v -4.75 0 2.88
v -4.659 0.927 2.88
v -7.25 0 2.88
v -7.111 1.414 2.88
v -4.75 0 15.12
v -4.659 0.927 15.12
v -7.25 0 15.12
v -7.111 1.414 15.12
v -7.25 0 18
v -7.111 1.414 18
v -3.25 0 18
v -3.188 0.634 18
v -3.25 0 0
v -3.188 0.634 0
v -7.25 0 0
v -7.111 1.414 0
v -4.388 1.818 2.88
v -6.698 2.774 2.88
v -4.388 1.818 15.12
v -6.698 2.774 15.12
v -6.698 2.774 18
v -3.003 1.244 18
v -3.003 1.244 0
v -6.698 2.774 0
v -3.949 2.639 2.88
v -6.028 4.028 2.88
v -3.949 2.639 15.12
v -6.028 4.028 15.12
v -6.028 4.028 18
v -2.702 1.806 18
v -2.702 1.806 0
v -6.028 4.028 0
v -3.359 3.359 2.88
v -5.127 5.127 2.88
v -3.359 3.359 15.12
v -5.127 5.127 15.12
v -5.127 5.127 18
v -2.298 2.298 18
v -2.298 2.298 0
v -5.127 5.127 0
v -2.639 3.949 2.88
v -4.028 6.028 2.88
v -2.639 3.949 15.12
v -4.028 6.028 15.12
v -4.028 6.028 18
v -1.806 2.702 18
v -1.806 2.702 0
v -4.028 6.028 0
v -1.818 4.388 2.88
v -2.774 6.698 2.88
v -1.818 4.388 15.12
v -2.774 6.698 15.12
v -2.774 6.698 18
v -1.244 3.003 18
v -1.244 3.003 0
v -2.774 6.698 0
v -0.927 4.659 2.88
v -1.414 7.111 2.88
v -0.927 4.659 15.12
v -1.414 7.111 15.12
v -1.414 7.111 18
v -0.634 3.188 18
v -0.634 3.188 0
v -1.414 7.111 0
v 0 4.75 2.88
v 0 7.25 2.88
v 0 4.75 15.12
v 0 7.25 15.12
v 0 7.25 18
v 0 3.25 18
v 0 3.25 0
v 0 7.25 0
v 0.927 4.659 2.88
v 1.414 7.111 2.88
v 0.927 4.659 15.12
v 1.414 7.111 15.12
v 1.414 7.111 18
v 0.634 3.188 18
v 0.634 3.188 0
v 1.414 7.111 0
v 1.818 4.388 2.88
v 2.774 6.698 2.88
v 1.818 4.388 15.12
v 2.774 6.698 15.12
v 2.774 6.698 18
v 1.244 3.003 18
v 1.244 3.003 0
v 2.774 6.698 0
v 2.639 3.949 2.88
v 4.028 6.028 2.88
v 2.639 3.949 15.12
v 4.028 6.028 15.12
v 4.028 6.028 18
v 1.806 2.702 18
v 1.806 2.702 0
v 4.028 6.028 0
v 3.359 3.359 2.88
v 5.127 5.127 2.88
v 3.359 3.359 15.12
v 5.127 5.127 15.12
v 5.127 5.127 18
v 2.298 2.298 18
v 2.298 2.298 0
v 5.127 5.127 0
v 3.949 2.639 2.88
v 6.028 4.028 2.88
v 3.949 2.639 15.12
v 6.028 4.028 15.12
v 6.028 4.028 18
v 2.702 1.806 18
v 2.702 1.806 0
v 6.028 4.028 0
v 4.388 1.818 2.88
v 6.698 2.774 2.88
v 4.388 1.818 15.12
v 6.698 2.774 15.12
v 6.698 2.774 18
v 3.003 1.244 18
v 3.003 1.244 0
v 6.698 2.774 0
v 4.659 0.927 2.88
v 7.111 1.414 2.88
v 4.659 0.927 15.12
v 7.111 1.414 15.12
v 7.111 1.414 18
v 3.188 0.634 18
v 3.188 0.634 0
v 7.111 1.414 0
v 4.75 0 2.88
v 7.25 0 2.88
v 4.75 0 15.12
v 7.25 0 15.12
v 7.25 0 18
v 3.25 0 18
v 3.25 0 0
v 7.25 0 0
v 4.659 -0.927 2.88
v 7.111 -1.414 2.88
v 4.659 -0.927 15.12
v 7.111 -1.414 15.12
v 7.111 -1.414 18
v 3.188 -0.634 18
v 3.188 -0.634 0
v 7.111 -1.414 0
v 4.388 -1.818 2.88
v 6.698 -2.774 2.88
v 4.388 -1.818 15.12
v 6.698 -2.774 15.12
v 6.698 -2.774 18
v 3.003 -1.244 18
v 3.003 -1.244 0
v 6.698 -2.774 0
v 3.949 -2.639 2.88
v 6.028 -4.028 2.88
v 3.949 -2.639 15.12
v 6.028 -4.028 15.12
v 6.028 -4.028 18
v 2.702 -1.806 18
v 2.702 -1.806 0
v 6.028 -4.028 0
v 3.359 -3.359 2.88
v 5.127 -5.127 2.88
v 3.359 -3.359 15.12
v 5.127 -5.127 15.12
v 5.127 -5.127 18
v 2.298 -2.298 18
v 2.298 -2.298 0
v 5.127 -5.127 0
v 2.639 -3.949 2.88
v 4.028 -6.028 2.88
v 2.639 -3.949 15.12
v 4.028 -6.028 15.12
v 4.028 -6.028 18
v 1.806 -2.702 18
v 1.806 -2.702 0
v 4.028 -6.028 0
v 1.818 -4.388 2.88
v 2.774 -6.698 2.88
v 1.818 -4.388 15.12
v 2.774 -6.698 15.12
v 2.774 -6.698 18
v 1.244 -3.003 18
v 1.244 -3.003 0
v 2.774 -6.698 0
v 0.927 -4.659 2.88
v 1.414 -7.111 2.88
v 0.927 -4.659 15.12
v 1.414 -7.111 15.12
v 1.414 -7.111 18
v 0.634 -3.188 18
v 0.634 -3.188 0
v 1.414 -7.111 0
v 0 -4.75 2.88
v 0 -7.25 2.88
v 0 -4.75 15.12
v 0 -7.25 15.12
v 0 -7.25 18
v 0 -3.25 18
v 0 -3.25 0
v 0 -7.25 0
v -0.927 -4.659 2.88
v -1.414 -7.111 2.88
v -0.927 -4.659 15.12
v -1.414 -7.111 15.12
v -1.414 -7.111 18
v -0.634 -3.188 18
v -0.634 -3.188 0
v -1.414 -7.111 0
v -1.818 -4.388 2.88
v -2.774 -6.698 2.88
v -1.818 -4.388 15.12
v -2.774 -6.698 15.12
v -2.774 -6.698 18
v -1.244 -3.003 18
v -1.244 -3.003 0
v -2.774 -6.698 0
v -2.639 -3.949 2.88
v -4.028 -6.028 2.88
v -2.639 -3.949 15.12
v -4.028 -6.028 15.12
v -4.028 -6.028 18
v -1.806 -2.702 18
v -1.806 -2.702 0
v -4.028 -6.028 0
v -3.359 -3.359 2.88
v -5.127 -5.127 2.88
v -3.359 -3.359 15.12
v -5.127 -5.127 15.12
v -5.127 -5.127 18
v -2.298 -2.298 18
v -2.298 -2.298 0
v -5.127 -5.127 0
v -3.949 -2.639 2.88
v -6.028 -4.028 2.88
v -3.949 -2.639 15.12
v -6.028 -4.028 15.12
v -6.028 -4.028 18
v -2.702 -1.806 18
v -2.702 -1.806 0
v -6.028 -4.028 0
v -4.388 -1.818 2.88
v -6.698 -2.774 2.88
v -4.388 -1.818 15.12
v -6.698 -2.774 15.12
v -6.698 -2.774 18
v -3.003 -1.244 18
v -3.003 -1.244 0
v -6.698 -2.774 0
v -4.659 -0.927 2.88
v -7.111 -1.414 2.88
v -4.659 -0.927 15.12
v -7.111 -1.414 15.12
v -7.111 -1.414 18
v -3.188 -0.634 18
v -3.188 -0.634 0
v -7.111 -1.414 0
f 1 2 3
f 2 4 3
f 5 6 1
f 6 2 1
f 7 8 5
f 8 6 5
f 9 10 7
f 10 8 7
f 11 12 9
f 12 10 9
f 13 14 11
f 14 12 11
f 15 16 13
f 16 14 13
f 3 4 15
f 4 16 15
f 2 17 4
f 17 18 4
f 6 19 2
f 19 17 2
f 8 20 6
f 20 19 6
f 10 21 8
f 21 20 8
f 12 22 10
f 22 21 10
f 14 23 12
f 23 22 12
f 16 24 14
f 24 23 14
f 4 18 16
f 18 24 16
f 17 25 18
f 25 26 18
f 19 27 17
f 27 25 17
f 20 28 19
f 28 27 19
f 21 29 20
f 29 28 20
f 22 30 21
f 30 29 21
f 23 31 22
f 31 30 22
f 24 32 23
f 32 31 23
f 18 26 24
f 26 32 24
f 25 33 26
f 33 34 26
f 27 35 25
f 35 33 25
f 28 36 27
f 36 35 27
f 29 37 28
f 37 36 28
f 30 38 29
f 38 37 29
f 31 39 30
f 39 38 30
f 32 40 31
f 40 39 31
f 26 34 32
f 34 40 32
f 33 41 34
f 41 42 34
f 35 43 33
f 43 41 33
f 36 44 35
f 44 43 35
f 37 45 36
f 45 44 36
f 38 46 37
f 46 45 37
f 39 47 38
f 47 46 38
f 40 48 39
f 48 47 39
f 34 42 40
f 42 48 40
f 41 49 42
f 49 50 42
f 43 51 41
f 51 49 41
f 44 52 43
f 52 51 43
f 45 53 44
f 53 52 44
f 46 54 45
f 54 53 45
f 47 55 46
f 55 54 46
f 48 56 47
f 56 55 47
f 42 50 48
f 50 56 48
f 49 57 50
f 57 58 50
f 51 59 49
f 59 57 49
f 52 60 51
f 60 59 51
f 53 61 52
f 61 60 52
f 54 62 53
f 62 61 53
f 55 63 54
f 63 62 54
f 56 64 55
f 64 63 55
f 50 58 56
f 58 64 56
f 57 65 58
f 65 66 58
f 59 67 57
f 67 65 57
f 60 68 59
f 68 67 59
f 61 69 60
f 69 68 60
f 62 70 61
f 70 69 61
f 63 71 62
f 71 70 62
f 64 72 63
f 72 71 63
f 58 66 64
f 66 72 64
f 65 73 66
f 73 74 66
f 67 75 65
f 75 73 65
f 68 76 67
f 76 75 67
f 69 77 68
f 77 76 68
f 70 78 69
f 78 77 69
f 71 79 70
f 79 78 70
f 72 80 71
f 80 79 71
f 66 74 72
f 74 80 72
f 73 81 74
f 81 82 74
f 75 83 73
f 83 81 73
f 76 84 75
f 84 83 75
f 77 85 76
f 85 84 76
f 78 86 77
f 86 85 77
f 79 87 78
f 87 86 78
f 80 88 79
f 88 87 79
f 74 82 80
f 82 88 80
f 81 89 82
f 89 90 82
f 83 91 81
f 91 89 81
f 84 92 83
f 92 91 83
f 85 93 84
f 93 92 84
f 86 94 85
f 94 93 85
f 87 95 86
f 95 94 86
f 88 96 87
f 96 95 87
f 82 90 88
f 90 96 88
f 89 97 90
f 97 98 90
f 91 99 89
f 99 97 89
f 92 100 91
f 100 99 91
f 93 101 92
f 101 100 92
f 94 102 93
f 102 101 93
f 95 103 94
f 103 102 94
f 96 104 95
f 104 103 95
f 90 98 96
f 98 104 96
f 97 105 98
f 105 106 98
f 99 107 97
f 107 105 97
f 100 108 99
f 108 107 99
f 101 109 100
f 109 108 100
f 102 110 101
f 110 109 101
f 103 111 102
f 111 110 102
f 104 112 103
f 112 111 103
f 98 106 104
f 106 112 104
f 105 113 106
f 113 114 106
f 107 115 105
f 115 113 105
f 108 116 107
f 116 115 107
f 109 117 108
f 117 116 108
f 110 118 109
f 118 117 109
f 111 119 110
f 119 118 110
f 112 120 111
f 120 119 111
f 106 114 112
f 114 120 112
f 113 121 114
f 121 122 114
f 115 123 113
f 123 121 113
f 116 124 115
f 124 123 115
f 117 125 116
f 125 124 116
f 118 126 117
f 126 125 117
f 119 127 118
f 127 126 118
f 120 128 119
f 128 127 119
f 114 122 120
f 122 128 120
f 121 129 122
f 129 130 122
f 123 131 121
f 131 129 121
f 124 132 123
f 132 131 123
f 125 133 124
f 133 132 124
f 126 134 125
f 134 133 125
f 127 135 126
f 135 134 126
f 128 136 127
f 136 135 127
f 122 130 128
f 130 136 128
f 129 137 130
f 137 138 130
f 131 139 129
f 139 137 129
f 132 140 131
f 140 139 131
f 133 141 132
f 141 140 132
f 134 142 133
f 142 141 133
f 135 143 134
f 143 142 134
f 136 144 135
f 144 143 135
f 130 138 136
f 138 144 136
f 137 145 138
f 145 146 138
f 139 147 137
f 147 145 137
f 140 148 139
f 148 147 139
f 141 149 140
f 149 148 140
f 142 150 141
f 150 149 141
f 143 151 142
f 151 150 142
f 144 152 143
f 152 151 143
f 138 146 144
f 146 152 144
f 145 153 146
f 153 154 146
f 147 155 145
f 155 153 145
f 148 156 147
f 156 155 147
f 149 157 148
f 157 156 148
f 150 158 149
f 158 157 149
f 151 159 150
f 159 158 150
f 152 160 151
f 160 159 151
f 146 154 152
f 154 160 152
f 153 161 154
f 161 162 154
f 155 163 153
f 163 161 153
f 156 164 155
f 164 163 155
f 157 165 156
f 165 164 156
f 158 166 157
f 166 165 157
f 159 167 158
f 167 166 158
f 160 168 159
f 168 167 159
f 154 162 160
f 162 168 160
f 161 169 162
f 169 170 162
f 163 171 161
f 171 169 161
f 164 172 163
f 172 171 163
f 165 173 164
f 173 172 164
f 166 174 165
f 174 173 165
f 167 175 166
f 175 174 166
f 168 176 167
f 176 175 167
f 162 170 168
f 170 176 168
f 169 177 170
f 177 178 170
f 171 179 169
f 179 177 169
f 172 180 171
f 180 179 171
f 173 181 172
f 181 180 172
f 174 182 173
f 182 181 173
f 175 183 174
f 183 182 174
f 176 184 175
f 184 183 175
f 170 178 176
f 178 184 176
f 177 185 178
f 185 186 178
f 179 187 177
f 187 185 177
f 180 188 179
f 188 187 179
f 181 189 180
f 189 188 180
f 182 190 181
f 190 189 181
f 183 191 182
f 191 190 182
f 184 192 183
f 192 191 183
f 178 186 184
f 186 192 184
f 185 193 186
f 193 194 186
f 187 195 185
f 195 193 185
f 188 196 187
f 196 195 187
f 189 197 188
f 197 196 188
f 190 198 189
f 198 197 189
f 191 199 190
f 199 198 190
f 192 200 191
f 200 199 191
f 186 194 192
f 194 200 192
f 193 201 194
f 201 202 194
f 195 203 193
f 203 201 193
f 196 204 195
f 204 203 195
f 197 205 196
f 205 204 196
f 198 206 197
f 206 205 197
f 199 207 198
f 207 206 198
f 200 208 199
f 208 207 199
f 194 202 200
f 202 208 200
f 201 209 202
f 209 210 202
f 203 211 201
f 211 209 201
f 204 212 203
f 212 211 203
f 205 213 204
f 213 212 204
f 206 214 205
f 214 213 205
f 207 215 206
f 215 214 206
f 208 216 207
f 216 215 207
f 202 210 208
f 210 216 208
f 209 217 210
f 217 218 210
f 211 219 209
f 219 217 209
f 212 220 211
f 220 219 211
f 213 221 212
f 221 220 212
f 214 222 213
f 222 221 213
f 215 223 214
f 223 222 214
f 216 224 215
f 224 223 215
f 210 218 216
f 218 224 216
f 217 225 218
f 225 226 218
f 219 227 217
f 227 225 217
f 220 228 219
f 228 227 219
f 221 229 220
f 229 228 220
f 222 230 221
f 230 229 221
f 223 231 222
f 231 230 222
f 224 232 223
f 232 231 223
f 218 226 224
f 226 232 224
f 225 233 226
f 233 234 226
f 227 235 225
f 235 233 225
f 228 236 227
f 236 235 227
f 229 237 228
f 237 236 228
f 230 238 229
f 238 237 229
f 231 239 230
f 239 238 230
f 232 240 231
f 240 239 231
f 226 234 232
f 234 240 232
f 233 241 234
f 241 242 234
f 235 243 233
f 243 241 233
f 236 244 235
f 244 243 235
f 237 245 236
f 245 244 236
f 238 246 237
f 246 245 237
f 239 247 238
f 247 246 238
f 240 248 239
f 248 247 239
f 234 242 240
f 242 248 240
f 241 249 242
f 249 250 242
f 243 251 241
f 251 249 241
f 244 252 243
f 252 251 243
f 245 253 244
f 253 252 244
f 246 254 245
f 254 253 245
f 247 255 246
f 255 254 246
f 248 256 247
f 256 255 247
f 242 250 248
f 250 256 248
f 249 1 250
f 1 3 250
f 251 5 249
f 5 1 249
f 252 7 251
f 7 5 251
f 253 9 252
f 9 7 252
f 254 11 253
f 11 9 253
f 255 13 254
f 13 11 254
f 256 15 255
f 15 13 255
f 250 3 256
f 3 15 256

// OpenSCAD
$fn = 32;

// ----------------------------------------------------------------------
// Profiled standoff: spool spacer, 18 mm long, bore 6.5 mm
// ----------------------------------------------------------------------

// --- parameters (mm) ---
revolve_angle = 360;      // full turn around the Z axis
profile_points = 8;       // points of the closed outline

profile = [[3.25, 0], [7.25, 0], [7.25, 2.88], [4.75, 2.88], [4.75, 15.12], [7.25, 15.12], [7.25, 18], [3.25, 18]];  // single closed polygon, 8 points, counter clockwise

// --- the one profile operation ---
rotate_extrude(angle = revolve_angle) polygon(points = profile);
